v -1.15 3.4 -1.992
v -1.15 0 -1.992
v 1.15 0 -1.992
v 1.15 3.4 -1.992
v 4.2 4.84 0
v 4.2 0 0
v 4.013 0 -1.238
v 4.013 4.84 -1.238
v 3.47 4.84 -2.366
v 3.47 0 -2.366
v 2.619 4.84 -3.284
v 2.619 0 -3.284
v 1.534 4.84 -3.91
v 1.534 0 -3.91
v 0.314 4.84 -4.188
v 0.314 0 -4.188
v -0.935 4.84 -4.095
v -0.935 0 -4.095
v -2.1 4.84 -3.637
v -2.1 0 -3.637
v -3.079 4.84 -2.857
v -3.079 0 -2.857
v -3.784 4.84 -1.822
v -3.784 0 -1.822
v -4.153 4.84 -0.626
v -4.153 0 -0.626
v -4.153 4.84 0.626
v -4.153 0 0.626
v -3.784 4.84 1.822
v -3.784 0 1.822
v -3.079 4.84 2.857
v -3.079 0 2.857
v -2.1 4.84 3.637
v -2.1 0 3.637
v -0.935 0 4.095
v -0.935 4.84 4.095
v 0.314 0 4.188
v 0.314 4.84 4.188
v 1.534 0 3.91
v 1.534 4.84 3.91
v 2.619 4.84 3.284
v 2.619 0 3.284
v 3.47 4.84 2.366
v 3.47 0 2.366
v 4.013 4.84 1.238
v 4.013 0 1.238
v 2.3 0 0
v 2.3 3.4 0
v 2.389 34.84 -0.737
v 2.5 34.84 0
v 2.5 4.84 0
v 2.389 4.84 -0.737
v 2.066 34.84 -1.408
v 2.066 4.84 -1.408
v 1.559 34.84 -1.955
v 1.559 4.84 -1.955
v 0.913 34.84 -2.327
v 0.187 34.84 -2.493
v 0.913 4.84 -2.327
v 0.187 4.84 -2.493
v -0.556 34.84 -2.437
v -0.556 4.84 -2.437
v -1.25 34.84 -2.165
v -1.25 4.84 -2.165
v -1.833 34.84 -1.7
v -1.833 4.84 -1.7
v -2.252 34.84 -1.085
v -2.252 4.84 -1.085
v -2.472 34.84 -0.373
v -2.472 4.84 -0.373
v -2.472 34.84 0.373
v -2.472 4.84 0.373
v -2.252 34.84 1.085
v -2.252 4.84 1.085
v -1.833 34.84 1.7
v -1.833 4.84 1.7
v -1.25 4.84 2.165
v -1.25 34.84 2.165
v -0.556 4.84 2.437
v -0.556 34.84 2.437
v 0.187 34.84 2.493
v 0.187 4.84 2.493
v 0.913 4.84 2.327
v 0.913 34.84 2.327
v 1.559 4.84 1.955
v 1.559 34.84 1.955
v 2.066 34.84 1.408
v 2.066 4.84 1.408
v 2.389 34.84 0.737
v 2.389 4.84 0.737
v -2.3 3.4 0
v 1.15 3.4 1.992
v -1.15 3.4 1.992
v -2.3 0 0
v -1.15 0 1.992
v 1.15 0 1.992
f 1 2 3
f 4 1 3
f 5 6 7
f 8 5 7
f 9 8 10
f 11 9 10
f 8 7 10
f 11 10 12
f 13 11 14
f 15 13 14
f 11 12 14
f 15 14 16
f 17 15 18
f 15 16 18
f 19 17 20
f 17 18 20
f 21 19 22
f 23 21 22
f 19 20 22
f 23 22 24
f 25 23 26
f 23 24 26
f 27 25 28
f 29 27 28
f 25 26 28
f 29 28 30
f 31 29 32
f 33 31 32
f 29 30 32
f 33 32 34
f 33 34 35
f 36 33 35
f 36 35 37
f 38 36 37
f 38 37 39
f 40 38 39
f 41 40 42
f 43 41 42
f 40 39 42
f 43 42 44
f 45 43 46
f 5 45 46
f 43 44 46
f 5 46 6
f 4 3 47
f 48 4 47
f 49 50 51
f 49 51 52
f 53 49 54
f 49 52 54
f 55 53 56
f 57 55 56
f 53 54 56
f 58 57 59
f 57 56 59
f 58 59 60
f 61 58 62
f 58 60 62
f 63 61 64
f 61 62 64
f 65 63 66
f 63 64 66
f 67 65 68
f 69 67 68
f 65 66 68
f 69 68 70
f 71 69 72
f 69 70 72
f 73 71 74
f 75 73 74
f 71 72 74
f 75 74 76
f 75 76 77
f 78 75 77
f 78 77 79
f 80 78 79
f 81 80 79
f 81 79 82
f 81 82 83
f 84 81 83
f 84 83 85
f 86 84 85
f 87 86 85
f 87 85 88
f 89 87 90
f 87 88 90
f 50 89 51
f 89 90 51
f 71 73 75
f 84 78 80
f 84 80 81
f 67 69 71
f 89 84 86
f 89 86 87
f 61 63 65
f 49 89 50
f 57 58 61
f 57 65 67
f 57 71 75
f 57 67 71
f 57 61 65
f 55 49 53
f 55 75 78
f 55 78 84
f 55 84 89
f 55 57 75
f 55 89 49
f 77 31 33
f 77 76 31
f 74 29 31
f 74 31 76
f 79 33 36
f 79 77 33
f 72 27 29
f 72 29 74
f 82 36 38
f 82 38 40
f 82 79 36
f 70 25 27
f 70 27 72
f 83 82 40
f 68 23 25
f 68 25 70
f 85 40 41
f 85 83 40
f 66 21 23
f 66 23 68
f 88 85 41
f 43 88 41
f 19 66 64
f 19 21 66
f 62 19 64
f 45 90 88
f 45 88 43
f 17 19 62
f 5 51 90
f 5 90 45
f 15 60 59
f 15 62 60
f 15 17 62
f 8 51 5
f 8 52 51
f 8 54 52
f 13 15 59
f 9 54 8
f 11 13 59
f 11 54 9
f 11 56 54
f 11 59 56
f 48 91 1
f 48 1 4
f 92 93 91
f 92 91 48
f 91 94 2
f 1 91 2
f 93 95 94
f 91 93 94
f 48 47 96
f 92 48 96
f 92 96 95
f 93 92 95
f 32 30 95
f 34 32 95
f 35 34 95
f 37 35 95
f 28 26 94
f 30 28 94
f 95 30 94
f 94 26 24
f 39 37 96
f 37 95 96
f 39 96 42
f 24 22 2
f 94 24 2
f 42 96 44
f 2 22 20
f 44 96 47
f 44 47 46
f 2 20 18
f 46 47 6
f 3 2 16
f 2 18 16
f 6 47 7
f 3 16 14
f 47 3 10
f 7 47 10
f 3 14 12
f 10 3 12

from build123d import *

# Parameters (mm, degrees)
SKETCH_1_R          = 4.2
EXTRUDE_1_DEPTH     = 4.84
SKETCH_2_R          = 2.5
EXTRUDE_2_DEPTH     = 30
CUT_EXTRUDE_1_DEPTH = 3.4


with BuildPart() as part:
    # 草图1 → 凸台-拉伸1 (new body)
    with BuildSketch(Plane(origin=(0, 0, 0), x_dir=(1, 0, 0), z_dir=(0, 1, 0))):
        Circle(SKETCH_1_R)
    extrude(amount=EXTRUDE_1_DEPTH)

    # 草图2 → 凸台-拉伸2 (add)
    with BuildSketch(Plane(origin=(0, 4.84, 0), x_dir=(1, 0, 0), z_dir=(0, 1, 0))):
        Circle(SKETCH_2_R)
    extrude(amount=EXTRUDE_2_DEPTH)

    # 草图3 → 切除-拉伸1 (cut)
    with BuildSketch(Plane.XZ):
        Polygon((2.3, 0), (1.15, 1.991858429), (-1.15, 1.991858429), (-2.3, 0), (-1.15, -1.991858429), (1.15, -1.991858429), align=None)
    extrude(amount=-CUT_EXTRUDE_1_DEPTH, mode=Mode.SUBTRACT)


solid = part.part
